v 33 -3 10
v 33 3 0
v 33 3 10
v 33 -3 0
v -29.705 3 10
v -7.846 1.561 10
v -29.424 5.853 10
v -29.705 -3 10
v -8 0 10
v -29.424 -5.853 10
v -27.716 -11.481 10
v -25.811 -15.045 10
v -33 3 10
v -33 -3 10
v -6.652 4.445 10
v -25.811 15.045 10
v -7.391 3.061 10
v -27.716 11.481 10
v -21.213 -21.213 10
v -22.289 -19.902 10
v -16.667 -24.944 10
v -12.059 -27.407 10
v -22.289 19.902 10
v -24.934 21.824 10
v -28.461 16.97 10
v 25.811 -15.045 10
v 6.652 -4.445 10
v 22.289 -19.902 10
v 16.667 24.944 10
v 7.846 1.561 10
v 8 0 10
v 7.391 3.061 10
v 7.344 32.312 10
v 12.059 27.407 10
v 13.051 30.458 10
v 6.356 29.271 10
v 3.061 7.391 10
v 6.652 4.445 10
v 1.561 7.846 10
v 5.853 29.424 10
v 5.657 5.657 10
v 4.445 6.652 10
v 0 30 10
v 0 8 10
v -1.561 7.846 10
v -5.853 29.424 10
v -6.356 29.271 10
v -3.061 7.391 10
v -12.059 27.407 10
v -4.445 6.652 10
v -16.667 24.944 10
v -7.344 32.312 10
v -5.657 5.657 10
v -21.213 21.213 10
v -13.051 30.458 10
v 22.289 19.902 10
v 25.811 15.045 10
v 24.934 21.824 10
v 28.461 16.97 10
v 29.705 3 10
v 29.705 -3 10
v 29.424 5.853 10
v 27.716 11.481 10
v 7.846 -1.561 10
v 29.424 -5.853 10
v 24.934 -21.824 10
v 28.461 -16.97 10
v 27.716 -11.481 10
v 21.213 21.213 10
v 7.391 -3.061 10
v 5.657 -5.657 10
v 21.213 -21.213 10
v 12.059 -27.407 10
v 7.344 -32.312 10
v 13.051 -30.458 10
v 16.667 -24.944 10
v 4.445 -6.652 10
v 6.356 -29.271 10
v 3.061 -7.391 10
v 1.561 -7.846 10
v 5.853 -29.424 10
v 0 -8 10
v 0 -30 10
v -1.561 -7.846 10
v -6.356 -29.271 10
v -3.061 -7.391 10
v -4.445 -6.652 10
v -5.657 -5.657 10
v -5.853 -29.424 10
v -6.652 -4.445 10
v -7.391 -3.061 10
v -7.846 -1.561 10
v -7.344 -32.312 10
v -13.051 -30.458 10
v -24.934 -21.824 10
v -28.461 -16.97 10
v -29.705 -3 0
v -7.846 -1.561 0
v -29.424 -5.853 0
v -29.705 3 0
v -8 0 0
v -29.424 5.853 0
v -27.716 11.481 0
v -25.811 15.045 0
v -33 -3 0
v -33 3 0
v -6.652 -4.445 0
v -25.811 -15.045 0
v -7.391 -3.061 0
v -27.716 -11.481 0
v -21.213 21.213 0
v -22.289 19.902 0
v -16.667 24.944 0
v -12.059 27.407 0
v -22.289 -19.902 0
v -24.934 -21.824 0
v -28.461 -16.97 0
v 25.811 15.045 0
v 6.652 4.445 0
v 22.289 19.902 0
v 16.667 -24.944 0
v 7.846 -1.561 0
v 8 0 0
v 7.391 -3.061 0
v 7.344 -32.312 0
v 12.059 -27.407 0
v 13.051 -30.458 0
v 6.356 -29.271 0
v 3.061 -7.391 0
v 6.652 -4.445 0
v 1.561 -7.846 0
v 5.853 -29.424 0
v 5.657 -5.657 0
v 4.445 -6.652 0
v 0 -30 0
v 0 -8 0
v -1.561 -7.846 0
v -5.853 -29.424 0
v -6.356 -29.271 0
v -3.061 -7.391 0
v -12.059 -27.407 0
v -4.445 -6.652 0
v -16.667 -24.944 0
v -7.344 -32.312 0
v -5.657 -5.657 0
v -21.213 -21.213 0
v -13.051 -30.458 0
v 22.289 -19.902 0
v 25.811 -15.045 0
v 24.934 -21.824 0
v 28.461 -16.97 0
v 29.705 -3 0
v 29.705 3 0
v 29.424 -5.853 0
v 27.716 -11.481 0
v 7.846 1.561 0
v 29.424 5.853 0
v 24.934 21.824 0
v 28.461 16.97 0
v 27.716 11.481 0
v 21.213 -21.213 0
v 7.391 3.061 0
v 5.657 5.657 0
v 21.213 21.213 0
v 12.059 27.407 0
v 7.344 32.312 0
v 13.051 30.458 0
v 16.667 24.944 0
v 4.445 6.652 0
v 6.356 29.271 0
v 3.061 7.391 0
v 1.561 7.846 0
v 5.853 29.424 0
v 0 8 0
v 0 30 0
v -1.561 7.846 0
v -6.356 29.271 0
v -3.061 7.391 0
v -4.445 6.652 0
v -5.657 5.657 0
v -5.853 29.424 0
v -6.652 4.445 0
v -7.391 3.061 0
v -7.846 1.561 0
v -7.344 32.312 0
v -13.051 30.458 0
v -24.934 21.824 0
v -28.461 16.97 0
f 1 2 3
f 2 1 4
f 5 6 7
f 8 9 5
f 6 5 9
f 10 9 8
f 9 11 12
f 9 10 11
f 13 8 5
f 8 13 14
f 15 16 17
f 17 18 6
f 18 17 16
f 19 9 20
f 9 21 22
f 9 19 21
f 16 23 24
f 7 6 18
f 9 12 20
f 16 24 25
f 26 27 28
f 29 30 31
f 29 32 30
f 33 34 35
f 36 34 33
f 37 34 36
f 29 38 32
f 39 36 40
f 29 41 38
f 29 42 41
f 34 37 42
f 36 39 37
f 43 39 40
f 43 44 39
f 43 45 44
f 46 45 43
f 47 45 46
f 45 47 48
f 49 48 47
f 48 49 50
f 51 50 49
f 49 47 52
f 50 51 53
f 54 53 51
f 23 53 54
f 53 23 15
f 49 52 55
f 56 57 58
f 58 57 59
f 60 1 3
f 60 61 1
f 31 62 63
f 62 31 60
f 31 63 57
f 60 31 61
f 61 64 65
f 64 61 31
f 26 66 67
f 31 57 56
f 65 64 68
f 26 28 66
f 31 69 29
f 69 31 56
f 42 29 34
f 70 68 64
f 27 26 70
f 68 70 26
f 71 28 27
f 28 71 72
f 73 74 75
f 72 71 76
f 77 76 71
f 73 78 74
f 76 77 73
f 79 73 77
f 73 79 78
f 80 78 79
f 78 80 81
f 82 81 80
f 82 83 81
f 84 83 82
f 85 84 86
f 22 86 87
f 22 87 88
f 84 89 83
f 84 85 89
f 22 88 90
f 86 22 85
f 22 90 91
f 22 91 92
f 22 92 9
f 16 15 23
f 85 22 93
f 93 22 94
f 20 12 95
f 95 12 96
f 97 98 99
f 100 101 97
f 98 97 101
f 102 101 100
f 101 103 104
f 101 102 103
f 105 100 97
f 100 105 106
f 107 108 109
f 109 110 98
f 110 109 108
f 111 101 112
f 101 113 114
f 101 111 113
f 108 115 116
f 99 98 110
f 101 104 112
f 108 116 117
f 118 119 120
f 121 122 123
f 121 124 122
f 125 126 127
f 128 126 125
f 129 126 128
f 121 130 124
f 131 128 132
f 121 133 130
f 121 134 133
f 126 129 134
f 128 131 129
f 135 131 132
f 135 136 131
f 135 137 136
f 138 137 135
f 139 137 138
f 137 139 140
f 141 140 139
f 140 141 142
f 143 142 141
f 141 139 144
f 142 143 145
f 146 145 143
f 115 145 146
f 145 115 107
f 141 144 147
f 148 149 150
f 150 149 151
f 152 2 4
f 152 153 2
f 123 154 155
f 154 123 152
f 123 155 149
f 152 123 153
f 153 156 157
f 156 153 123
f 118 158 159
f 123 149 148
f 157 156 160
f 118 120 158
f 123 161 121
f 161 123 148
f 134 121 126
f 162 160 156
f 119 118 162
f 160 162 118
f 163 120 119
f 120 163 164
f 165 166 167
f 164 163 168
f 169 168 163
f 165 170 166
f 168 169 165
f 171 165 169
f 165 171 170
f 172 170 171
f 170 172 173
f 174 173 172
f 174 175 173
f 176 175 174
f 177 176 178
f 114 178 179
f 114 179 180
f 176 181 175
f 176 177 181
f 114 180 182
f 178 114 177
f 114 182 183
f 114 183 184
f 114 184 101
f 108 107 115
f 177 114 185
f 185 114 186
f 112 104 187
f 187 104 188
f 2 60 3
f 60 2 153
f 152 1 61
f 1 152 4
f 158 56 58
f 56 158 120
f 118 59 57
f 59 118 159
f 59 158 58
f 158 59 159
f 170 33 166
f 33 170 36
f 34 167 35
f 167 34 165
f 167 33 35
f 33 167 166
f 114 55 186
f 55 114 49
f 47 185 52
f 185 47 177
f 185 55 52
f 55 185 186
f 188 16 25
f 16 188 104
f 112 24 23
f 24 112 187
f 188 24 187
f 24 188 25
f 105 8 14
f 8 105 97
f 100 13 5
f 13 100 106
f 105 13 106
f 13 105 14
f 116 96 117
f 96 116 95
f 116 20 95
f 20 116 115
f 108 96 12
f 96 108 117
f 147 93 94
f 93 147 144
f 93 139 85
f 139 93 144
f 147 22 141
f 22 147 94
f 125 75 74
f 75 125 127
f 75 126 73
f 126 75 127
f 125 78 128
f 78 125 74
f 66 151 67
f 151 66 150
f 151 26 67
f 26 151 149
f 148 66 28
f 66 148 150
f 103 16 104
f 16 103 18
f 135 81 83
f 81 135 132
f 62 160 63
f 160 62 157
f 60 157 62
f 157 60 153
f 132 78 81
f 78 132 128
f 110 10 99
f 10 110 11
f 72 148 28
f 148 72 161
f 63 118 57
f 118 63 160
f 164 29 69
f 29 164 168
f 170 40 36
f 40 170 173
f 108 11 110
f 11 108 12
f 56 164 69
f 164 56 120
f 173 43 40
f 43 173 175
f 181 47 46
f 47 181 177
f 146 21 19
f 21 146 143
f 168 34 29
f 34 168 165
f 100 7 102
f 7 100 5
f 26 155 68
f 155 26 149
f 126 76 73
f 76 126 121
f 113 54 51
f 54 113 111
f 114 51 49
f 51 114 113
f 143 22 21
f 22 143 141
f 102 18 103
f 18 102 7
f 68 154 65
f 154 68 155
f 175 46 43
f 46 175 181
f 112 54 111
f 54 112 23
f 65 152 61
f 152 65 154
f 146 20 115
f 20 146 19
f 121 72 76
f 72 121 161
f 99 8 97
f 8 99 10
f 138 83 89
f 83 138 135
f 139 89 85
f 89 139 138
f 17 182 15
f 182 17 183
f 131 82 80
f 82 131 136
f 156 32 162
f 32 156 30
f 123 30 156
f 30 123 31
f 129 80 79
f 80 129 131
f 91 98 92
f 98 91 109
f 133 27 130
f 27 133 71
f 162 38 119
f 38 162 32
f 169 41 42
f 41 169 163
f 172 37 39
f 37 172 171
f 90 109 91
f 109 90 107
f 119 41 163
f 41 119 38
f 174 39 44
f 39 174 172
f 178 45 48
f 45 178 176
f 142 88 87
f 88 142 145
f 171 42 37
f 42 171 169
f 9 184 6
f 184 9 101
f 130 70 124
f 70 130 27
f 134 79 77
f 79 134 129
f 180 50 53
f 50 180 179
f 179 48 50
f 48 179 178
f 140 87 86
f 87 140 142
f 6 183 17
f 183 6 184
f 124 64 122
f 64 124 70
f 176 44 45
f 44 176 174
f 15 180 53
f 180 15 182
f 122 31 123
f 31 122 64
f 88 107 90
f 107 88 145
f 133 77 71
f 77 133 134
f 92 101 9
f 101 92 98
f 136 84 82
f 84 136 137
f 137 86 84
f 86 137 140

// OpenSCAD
$fn = 32;

// ----------------------------------------------------------------------
// Spur blank: bored gear blank
// ----------------------------------------------------------------------

// --- parameters (mm) ---
disc_r = 30;              // blank root radius
disc_t = 10;              // blank thickness
n_teeth = 10;             // stub tooth count
tooth_w = 6;              // tooth width at the root
tooth_h = 3;              // tooth height above the root
bore_r = 8;               // central bore radius
fit_tol = 0.05;           // tolerance for press fits, mm
free_tol = 0.2;           // tolerance for clearance fits, mm

out_r = disc_r + tooth_h;  // tip radius
bbox_x = 66.0;  // measured width over the teeth
bbox_y = 64.62;  // measured depth over the teeth

difference() {
union() {
  cylinder(r = disc_r, h = disc_t);
  for (i = [0 : n_teeth - 1])
    rotate([0, 0, i * 360 / n_teeth])
      translate([disc_r - 1, -tooth_w / 2, 0])
        cube([tooth_h + 1, tooth_w, disc_t]);
}
  translate([0, 0, -1]) cylinder(r = bore_r, h = disc_t + 2);
}
